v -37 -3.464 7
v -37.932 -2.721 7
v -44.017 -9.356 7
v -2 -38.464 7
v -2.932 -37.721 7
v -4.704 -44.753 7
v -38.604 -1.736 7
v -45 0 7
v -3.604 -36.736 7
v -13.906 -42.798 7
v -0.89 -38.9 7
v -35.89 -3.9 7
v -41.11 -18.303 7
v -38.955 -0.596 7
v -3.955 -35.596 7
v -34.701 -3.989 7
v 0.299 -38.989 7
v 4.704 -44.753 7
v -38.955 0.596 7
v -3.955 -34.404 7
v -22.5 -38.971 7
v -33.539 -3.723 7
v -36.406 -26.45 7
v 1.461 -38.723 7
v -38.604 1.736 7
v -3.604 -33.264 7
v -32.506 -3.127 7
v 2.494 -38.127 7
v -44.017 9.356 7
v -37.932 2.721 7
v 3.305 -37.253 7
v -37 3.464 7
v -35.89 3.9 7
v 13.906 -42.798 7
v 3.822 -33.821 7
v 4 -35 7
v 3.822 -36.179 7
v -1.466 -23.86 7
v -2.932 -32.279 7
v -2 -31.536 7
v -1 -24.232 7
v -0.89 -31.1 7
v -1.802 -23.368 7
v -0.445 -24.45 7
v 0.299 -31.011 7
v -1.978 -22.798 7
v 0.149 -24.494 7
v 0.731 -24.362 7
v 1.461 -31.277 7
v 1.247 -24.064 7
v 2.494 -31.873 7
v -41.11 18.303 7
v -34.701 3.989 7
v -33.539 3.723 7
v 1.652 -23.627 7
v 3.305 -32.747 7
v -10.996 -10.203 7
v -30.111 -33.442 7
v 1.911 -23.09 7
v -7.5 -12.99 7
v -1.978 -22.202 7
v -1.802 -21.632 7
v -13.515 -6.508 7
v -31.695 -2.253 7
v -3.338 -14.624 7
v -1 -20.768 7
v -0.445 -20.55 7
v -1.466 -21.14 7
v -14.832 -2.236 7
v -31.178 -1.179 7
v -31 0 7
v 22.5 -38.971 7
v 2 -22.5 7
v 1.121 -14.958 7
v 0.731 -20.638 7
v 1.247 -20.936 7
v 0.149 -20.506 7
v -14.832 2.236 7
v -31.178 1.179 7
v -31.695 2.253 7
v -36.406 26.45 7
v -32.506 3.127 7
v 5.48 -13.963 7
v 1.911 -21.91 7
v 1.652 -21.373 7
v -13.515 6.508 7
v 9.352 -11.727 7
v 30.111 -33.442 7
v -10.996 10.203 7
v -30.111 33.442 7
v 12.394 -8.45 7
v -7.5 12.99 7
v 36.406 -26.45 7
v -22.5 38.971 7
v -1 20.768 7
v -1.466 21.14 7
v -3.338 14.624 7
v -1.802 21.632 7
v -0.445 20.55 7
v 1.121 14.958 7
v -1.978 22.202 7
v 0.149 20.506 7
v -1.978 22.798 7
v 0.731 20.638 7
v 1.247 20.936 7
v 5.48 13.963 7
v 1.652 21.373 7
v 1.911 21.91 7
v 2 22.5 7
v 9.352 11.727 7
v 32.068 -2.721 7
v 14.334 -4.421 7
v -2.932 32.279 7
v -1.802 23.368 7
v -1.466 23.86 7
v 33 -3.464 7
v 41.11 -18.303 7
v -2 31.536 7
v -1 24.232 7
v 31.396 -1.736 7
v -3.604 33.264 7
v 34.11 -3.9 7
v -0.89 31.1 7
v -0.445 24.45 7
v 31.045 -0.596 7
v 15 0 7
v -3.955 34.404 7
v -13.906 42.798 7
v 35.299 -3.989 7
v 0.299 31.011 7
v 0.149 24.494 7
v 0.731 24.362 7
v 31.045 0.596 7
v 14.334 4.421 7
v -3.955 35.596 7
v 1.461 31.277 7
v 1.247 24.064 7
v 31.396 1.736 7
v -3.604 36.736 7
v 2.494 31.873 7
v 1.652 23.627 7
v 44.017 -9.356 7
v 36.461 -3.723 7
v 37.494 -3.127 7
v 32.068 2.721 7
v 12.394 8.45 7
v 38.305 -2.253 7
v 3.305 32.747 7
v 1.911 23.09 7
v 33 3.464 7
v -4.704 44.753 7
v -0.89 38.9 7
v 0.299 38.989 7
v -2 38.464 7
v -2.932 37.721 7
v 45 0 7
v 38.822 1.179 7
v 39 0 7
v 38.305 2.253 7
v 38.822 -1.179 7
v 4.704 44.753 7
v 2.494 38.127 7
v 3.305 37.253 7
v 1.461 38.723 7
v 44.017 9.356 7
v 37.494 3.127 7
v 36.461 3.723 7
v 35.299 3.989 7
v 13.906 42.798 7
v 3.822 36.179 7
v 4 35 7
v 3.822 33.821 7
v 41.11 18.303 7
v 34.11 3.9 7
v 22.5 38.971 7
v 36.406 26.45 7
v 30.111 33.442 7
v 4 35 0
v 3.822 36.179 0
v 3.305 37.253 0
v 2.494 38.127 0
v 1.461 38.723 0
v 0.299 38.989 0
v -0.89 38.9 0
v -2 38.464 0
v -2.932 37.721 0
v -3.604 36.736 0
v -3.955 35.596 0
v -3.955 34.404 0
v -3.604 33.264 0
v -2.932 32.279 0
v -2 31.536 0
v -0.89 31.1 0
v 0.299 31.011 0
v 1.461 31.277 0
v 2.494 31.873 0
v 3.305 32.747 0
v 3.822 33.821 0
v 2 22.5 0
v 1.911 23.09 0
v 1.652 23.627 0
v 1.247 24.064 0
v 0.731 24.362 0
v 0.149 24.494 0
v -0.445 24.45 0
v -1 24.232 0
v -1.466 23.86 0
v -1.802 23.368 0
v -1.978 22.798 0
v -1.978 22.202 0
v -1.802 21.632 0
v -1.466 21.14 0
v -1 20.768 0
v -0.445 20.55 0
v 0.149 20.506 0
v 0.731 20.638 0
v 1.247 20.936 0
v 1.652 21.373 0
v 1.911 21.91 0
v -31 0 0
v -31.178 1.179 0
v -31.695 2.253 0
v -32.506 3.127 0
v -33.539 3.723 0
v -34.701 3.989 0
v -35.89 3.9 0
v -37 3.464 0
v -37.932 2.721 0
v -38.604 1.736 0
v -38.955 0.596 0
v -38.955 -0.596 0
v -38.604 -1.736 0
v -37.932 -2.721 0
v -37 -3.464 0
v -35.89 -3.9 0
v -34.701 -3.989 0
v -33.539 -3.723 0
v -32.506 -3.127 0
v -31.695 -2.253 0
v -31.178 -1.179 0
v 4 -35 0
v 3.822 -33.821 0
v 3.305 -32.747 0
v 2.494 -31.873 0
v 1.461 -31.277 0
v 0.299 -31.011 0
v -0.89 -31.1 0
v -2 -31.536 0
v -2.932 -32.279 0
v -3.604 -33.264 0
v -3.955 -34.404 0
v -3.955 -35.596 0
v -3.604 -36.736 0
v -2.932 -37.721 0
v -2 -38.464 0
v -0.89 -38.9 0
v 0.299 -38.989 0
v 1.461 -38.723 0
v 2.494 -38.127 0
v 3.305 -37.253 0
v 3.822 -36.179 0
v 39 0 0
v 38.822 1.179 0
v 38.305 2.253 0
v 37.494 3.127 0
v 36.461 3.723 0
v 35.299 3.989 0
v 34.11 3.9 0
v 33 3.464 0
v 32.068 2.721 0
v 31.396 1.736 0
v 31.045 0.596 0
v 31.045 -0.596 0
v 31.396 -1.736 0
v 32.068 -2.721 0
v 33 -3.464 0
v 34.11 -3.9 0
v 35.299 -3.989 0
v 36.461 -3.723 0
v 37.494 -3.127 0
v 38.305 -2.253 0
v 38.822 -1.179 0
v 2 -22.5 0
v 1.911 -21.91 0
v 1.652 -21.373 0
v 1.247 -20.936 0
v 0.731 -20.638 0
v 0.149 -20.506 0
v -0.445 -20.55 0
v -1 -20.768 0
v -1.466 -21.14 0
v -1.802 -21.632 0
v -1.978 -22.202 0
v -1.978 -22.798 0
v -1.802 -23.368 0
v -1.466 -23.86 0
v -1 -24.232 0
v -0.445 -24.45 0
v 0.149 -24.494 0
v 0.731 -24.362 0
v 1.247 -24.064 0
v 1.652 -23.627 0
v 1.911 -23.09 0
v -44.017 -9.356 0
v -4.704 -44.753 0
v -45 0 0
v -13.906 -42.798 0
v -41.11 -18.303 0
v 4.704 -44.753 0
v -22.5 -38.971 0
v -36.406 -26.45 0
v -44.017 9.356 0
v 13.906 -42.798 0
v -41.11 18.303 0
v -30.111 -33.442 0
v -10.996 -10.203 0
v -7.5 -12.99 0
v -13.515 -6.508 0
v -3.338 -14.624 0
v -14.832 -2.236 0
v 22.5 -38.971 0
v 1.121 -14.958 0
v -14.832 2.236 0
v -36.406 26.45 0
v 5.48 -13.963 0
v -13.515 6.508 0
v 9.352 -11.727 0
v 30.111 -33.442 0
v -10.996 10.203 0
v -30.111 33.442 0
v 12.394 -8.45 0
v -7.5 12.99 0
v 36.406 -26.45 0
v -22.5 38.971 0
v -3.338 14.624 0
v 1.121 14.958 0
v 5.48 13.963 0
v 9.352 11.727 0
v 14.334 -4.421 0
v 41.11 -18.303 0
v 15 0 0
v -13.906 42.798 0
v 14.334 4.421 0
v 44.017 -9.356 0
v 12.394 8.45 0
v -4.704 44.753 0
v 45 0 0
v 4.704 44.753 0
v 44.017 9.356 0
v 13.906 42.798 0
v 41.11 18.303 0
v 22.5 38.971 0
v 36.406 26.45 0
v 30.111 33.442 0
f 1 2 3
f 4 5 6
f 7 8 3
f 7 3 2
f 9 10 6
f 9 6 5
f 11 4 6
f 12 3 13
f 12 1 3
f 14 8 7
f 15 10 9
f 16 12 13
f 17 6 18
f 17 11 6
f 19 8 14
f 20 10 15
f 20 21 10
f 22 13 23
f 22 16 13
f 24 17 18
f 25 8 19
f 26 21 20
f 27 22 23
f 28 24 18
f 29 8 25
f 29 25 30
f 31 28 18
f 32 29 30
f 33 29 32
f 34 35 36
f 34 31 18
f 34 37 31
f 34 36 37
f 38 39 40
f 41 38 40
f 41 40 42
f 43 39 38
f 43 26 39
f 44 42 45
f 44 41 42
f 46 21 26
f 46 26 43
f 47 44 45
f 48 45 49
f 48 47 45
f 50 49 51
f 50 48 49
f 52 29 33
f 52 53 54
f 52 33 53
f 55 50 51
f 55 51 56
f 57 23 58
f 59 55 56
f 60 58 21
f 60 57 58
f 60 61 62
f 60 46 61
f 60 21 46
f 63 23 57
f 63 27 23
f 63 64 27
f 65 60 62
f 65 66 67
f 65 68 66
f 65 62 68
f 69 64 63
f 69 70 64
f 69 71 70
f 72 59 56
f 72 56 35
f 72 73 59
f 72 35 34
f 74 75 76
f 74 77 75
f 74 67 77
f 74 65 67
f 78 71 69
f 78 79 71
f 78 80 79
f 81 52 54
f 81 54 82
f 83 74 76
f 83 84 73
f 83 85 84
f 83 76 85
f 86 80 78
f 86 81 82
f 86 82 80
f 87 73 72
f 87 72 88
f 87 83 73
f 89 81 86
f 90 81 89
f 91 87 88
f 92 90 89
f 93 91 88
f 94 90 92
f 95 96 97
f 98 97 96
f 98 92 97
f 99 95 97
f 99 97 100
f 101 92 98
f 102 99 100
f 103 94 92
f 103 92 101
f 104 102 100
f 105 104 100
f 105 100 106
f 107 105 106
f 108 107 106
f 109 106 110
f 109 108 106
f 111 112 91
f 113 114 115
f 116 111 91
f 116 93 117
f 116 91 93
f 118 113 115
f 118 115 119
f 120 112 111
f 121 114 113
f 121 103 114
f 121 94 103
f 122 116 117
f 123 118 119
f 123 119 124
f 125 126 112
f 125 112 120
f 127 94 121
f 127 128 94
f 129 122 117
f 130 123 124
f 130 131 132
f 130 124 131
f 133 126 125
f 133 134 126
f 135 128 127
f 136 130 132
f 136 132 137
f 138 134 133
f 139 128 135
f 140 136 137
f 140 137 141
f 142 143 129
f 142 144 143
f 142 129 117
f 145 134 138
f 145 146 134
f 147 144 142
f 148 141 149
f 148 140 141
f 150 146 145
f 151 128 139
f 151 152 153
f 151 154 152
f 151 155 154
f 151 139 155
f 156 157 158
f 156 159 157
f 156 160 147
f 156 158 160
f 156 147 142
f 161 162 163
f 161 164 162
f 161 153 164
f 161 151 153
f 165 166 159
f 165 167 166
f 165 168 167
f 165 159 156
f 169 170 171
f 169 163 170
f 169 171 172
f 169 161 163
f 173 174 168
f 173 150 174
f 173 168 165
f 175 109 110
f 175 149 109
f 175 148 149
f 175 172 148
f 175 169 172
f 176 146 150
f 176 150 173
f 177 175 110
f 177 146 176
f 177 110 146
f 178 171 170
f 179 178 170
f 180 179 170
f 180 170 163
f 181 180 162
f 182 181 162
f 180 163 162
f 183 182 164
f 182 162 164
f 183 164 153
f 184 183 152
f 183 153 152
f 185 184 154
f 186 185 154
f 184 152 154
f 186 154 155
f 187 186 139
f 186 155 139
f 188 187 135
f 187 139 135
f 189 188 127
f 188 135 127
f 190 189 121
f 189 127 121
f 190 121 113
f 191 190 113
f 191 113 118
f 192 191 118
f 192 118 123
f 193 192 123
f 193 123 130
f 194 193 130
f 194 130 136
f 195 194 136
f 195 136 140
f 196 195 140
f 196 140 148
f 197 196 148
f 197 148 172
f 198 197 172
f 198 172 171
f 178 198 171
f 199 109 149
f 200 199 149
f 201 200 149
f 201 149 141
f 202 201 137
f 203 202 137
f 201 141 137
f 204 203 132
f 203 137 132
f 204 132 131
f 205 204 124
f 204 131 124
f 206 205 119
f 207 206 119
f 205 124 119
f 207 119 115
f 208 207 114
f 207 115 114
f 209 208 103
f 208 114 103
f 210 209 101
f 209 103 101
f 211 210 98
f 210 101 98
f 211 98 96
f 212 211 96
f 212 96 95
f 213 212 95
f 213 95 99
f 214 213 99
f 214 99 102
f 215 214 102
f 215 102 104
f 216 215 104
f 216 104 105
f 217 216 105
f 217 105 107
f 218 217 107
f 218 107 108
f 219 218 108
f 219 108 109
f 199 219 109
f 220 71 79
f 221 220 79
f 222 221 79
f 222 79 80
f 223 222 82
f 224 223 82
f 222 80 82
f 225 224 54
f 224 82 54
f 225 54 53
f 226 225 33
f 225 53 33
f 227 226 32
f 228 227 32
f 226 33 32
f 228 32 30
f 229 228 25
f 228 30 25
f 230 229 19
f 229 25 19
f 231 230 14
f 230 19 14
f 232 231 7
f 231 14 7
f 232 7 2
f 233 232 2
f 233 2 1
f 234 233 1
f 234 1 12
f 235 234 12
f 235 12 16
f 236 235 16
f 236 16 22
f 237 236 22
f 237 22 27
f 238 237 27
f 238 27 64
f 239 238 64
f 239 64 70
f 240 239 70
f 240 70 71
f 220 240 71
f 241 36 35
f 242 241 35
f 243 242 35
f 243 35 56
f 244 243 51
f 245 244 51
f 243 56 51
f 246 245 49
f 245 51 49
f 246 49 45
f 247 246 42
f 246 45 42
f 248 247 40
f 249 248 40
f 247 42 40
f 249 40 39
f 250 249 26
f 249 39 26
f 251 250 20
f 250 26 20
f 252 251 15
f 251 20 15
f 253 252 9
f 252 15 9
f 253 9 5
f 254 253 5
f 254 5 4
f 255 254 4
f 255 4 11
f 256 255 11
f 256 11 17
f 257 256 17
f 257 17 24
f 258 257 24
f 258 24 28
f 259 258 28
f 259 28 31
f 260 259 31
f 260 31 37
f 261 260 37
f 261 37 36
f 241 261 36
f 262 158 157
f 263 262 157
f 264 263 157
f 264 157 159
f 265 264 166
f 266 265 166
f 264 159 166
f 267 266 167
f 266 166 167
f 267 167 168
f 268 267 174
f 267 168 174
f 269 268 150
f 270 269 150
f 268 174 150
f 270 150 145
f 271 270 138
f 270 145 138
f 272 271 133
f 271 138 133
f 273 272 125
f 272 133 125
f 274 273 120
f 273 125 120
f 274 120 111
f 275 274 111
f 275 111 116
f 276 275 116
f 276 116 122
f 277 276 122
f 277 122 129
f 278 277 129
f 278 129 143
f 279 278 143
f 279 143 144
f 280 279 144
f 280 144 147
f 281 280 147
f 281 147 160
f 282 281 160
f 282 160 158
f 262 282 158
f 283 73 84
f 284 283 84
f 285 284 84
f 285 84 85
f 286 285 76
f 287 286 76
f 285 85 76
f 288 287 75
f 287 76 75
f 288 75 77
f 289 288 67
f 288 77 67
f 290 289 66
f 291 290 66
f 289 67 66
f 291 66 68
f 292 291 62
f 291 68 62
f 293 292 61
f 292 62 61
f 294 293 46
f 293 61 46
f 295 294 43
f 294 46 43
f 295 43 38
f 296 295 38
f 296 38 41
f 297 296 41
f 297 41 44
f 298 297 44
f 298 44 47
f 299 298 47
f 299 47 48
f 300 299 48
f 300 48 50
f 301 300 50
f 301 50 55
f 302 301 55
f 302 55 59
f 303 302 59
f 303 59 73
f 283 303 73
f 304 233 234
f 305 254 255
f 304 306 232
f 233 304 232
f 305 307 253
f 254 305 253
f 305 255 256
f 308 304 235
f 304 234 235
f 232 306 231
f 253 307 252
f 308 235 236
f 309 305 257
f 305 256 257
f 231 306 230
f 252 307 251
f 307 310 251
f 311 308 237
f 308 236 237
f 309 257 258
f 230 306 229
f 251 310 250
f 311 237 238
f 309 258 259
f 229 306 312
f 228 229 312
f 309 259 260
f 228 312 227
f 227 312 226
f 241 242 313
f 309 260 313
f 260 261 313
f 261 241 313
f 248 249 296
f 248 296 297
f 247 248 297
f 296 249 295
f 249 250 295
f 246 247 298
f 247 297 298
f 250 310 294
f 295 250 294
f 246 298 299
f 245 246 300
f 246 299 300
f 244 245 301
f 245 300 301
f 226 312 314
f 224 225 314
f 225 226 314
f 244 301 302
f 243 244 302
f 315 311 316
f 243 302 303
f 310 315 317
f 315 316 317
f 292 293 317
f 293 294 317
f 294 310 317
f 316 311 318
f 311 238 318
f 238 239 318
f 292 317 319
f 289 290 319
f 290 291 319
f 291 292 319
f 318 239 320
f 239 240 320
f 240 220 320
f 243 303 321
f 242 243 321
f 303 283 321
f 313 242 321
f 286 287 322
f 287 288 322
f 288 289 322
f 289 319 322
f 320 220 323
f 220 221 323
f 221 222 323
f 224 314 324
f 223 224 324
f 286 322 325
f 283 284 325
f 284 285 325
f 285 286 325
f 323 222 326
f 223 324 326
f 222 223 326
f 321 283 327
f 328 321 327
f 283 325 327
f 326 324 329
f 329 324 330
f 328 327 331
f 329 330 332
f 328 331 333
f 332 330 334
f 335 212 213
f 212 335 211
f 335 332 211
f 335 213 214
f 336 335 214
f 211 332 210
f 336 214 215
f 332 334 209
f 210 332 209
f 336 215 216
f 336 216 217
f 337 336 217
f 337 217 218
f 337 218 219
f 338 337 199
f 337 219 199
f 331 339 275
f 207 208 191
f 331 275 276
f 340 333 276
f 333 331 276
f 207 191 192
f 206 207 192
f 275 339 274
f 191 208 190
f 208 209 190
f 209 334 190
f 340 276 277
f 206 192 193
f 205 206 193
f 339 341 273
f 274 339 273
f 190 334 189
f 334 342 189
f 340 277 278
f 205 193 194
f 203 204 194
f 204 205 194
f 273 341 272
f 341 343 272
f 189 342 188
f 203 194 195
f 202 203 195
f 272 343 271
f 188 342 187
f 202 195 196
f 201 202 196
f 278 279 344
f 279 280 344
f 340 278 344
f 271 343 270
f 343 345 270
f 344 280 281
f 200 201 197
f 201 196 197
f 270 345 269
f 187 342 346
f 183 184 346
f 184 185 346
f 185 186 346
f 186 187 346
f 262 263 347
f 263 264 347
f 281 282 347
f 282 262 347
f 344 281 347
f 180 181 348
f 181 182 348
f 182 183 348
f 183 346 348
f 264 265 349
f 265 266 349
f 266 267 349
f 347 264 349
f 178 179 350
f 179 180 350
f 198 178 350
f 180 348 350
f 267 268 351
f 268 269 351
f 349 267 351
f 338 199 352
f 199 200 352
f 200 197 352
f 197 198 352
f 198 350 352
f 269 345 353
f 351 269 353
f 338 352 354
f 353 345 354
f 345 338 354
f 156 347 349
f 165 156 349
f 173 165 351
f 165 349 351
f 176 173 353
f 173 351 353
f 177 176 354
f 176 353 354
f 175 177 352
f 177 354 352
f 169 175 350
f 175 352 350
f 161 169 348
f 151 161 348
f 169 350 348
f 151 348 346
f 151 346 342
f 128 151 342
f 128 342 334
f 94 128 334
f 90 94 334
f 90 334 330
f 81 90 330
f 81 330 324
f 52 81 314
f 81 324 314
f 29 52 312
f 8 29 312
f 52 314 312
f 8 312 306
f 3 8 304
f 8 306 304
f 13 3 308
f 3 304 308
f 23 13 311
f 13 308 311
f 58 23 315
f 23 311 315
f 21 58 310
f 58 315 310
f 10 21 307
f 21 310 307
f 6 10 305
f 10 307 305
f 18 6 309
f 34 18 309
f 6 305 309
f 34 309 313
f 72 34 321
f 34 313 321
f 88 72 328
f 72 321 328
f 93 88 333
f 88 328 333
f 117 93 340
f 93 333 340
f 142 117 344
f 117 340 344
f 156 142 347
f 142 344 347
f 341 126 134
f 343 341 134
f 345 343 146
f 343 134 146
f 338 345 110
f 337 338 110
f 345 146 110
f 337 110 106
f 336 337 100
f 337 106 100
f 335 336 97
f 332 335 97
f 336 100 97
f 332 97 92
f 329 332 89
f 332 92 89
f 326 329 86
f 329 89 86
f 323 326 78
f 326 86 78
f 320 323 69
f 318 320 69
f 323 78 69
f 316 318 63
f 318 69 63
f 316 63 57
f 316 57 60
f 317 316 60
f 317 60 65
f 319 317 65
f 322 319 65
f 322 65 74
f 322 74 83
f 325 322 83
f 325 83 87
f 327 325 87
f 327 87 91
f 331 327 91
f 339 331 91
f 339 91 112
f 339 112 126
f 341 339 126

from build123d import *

# Parameters (mm, degrees)
CROQUIS1_R              = 45
SALIENTE_EXTRUIR1_DEPTH = 7
CROQUIS2_R              = 15
CORTAR_EXTRUIR1_DEPTH   = 8
CROQUIS3_R              = 4
CORTAR_EXTRUIR2_DEPTH   = 8
CROQUIS4_R              = 2
CORTAR_EXTRUIR3_DEPTH   = 8


with BuildPart() as part:
    # Croquis1 → Saliente-Extruir1 (new body)
    with BuildSketch(Plane.XY):
        Circle(CROQUIS1_R)
    extrude(amount=SALIENTE_EXTRUIR1_DEPTH)

    # Croquis2 → Cortar-Extruir1 (cut, through all)
    with BuildSketch(Plane.XY.offset(7)):
        Circle(CROQUIS2_R)
    extrude(amount=-CORTAR_EXTRUIR1_DEPTH, mode=Mode.SUBTRACT)

    # Croquis3 → Cortar-Extruir2 (cut, through all)
    with BuildSketch(Plane.XY.offset(7)):
        with Locations((0, 35)):
            Circle(CROQUIS3_R)
        with Locations((35, 0)):
            Circle(CROQUIS3_R)
        with Locations((0, -35)):
            Circle(CROQUIS3_R)
        with Locations((-35, 0)):
            Circle(CROQUIS3_R)
    extrude(amount=-CORTAR_EXTRUIR2_DEPTH, mode=Mode.SUBTRACT)

    # Croquis4 → Cortar-Extruir3 (cut, through all)
    with BuildSketch(Plane.XY.offset(7)):
        with Locations((0, 22.5)):
            Circle(CROQUIS4_R)
        with Locations((0, -22.5)):
            Circle(CROQUIS4_R)
    extrude(amount=-CORTAR_EXTRUIR3_DEPTH, mode=Mode.SUBTRACT)


solid = part.part
